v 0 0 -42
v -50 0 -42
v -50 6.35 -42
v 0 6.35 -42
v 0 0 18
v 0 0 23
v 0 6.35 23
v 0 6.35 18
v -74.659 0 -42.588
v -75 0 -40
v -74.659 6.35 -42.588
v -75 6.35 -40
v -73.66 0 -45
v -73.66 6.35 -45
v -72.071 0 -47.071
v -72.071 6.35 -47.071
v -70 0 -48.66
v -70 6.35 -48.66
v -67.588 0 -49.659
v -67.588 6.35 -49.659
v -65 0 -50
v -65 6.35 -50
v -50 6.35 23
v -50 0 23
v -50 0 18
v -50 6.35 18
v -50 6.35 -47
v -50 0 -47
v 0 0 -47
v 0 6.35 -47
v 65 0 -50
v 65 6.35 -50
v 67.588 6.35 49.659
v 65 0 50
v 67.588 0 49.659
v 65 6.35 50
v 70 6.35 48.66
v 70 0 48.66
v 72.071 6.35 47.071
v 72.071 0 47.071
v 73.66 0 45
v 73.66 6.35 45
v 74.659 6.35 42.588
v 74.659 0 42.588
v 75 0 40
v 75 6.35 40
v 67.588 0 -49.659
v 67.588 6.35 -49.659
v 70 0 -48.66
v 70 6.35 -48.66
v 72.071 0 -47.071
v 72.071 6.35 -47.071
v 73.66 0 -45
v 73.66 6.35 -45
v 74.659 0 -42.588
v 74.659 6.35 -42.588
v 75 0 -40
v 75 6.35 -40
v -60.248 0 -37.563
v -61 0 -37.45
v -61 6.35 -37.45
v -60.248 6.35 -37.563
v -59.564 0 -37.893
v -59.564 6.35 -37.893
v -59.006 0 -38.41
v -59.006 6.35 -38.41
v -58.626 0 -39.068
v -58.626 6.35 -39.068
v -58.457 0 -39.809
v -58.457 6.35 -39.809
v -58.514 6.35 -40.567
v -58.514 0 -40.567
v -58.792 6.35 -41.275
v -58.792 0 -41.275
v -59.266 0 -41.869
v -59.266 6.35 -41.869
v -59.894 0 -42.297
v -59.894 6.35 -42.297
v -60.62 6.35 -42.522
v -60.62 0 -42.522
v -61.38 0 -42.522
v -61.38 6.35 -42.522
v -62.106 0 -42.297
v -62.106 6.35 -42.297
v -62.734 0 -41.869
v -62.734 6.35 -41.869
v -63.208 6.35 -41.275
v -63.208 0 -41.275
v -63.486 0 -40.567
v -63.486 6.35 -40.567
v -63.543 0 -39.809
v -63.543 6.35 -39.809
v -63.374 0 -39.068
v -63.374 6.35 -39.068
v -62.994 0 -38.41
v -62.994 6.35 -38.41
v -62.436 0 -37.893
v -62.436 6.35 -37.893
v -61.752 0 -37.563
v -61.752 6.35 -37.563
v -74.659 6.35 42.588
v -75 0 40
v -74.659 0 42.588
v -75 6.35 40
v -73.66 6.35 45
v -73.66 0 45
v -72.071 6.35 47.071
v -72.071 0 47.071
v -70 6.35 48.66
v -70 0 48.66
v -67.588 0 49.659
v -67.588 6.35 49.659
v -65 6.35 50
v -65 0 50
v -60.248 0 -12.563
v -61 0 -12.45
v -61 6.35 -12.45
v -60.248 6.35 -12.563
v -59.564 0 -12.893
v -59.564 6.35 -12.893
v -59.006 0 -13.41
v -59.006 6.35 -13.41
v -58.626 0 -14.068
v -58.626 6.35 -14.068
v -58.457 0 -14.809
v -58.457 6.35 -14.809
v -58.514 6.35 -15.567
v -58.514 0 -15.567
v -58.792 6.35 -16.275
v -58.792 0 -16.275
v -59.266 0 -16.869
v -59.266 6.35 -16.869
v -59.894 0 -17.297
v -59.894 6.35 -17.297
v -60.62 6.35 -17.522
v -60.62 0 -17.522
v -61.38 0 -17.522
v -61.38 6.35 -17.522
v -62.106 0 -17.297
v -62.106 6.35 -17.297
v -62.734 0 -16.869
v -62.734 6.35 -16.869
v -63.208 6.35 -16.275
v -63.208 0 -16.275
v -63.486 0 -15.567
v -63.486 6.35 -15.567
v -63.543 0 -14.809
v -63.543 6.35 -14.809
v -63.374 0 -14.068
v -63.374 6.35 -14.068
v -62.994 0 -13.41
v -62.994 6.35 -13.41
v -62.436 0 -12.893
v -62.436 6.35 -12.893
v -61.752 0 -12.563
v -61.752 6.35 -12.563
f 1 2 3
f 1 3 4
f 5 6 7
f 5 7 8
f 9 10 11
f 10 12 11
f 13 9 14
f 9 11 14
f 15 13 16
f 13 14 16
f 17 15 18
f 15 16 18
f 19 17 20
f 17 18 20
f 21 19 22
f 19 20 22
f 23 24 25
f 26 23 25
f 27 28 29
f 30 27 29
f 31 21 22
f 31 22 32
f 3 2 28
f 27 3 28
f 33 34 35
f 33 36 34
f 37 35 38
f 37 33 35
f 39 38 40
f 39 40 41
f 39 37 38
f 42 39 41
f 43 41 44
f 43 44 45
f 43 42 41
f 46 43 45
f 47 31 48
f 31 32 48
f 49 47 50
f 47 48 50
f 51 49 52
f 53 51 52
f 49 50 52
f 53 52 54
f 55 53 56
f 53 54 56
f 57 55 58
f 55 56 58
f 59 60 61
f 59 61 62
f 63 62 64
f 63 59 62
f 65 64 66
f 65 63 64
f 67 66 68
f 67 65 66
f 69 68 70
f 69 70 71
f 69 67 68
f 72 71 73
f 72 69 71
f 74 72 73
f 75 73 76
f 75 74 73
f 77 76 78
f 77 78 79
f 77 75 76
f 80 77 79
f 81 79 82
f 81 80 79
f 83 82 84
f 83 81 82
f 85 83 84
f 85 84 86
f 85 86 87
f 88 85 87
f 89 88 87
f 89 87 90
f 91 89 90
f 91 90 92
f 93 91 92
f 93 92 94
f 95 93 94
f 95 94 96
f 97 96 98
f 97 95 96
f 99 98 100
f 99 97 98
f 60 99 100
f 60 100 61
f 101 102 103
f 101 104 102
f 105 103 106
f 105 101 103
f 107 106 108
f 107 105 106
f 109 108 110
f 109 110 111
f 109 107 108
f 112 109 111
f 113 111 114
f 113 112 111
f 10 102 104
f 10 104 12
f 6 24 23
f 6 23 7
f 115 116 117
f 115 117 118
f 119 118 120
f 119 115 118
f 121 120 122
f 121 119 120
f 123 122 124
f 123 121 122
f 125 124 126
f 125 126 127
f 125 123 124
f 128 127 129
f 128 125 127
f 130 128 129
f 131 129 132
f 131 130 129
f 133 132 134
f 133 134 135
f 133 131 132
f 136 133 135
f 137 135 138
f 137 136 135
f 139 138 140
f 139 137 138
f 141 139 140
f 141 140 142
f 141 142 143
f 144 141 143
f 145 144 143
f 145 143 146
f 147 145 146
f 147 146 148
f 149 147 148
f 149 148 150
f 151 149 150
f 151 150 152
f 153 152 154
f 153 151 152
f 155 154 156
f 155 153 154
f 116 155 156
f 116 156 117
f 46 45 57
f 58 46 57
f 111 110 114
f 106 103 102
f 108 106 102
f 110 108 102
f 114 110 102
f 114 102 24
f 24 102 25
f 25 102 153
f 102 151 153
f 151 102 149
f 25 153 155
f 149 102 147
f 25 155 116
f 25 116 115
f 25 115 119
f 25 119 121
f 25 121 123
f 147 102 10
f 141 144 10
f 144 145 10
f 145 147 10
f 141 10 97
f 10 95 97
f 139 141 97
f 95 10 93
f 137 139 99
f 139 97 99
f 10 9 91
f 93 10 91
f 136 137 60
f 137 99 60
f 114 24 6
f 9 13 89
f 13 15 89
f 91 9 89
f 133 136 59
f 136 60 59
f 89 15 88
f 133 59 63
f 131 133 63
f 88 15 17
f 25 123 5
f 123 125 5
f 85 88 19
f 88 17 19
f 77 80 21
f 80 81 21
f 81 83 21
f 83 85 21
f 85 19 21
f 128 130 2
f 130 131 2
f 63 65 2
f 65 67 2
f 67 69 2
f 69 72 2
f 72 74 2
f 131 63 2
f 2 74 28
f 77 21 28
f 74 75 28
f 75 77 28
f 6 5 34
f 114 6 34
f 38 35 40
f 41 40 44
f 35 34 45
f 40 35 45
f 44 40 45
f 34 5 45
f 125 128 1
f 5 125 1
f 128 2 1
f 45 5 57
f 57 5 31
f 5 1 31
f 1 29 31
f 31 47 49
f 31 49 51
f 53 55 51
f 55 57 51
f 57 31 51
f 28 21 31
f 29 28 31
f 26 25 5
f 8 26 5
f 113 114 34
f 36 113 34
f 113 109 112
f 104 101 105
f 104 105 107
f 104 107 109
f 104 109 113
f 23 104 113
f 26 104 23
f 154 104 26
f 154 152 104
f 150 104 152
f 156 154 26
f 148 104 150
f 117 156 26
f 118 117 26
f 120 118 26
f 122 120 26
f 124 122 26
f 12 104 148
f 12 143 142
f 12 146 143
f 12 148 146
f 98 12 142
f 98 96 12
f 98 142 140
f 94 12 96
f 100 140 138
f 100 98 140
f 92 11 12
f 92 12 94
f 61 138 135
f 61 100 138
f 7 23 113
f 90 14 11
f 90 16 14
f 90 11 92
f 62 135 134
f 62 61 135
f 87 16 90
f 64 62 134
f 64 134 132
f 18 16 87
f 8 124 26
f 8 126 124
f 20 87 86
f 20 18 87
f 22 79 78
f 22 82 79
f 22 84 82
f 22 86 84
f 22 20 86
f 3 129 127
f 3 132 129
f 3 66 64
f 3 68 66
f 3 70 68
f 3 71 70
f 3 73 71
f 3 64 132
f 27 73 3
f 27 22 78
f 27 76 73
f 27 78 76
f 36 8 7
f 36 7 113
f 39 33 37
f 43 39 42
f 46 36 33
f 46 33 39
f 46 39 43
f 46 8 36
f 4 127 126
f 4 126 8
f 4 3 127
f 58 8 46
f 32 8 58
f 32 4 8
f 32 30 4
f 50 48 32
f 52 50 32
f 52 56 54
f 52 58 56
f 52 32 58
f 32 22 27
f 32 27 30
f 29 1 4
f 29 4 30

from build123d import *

# Parameters (mm, degrees)
SKETCH1_W           = 150
SKETCH1_H           = 100
SKETCH1_R           = 2.55
SKETCH1_W_2         = 50
SKETCH1_H_2         = 5
BOSS_EXTRUDE1_DEPTH = 6.35
FILLET1_R           = 10


with BuildPart() as part:
    # Sketch1 → Boss-Extrude1 (new body)
    with BuildSketch(Plane(origin=(0, 0, 0), x_dir=(1, 0, 0), z_dir=(0, 1, 0))):
        Rectangle(SKETCH1_W, SKETCH1_H)
        with Locations(Location((-61, 40, 0), (0, 0, 270))):
            Circle(SKETCH1_R, mode=Mode.SUBTRACT)
        with Locations(Location((-61, 15, 0), (0, 0, 270))):
            Circle(SKETCH1_R, mode=Mode.SUBTRACT)
        with Locations((-25, 44.5)):
            Rectangle(SKETCH1_W_2, SKETCH1_H_2, mode=Mode.SUBTRACT)
        with Locations((-25, -20.5)):
            Rectangle(SKETCH1_W_2, SKETCH1_H_2, mode=Mode.SUBTRACT)
    extrude(amount=BOSS_EXTRUDE1_DEPTH)

    # Fillet1
    fillet1_edges = [part.edges().sort_by_distance(p)[0] for p in [
        (75, 3.175, 50),
        (-75, 3.175, 50),
        (-75, 3.175, -50),
        (75, 3.175, -50),
    ]]
    fillet(fillet1_edges, radius=FILLET1_R)


solid = part.part
